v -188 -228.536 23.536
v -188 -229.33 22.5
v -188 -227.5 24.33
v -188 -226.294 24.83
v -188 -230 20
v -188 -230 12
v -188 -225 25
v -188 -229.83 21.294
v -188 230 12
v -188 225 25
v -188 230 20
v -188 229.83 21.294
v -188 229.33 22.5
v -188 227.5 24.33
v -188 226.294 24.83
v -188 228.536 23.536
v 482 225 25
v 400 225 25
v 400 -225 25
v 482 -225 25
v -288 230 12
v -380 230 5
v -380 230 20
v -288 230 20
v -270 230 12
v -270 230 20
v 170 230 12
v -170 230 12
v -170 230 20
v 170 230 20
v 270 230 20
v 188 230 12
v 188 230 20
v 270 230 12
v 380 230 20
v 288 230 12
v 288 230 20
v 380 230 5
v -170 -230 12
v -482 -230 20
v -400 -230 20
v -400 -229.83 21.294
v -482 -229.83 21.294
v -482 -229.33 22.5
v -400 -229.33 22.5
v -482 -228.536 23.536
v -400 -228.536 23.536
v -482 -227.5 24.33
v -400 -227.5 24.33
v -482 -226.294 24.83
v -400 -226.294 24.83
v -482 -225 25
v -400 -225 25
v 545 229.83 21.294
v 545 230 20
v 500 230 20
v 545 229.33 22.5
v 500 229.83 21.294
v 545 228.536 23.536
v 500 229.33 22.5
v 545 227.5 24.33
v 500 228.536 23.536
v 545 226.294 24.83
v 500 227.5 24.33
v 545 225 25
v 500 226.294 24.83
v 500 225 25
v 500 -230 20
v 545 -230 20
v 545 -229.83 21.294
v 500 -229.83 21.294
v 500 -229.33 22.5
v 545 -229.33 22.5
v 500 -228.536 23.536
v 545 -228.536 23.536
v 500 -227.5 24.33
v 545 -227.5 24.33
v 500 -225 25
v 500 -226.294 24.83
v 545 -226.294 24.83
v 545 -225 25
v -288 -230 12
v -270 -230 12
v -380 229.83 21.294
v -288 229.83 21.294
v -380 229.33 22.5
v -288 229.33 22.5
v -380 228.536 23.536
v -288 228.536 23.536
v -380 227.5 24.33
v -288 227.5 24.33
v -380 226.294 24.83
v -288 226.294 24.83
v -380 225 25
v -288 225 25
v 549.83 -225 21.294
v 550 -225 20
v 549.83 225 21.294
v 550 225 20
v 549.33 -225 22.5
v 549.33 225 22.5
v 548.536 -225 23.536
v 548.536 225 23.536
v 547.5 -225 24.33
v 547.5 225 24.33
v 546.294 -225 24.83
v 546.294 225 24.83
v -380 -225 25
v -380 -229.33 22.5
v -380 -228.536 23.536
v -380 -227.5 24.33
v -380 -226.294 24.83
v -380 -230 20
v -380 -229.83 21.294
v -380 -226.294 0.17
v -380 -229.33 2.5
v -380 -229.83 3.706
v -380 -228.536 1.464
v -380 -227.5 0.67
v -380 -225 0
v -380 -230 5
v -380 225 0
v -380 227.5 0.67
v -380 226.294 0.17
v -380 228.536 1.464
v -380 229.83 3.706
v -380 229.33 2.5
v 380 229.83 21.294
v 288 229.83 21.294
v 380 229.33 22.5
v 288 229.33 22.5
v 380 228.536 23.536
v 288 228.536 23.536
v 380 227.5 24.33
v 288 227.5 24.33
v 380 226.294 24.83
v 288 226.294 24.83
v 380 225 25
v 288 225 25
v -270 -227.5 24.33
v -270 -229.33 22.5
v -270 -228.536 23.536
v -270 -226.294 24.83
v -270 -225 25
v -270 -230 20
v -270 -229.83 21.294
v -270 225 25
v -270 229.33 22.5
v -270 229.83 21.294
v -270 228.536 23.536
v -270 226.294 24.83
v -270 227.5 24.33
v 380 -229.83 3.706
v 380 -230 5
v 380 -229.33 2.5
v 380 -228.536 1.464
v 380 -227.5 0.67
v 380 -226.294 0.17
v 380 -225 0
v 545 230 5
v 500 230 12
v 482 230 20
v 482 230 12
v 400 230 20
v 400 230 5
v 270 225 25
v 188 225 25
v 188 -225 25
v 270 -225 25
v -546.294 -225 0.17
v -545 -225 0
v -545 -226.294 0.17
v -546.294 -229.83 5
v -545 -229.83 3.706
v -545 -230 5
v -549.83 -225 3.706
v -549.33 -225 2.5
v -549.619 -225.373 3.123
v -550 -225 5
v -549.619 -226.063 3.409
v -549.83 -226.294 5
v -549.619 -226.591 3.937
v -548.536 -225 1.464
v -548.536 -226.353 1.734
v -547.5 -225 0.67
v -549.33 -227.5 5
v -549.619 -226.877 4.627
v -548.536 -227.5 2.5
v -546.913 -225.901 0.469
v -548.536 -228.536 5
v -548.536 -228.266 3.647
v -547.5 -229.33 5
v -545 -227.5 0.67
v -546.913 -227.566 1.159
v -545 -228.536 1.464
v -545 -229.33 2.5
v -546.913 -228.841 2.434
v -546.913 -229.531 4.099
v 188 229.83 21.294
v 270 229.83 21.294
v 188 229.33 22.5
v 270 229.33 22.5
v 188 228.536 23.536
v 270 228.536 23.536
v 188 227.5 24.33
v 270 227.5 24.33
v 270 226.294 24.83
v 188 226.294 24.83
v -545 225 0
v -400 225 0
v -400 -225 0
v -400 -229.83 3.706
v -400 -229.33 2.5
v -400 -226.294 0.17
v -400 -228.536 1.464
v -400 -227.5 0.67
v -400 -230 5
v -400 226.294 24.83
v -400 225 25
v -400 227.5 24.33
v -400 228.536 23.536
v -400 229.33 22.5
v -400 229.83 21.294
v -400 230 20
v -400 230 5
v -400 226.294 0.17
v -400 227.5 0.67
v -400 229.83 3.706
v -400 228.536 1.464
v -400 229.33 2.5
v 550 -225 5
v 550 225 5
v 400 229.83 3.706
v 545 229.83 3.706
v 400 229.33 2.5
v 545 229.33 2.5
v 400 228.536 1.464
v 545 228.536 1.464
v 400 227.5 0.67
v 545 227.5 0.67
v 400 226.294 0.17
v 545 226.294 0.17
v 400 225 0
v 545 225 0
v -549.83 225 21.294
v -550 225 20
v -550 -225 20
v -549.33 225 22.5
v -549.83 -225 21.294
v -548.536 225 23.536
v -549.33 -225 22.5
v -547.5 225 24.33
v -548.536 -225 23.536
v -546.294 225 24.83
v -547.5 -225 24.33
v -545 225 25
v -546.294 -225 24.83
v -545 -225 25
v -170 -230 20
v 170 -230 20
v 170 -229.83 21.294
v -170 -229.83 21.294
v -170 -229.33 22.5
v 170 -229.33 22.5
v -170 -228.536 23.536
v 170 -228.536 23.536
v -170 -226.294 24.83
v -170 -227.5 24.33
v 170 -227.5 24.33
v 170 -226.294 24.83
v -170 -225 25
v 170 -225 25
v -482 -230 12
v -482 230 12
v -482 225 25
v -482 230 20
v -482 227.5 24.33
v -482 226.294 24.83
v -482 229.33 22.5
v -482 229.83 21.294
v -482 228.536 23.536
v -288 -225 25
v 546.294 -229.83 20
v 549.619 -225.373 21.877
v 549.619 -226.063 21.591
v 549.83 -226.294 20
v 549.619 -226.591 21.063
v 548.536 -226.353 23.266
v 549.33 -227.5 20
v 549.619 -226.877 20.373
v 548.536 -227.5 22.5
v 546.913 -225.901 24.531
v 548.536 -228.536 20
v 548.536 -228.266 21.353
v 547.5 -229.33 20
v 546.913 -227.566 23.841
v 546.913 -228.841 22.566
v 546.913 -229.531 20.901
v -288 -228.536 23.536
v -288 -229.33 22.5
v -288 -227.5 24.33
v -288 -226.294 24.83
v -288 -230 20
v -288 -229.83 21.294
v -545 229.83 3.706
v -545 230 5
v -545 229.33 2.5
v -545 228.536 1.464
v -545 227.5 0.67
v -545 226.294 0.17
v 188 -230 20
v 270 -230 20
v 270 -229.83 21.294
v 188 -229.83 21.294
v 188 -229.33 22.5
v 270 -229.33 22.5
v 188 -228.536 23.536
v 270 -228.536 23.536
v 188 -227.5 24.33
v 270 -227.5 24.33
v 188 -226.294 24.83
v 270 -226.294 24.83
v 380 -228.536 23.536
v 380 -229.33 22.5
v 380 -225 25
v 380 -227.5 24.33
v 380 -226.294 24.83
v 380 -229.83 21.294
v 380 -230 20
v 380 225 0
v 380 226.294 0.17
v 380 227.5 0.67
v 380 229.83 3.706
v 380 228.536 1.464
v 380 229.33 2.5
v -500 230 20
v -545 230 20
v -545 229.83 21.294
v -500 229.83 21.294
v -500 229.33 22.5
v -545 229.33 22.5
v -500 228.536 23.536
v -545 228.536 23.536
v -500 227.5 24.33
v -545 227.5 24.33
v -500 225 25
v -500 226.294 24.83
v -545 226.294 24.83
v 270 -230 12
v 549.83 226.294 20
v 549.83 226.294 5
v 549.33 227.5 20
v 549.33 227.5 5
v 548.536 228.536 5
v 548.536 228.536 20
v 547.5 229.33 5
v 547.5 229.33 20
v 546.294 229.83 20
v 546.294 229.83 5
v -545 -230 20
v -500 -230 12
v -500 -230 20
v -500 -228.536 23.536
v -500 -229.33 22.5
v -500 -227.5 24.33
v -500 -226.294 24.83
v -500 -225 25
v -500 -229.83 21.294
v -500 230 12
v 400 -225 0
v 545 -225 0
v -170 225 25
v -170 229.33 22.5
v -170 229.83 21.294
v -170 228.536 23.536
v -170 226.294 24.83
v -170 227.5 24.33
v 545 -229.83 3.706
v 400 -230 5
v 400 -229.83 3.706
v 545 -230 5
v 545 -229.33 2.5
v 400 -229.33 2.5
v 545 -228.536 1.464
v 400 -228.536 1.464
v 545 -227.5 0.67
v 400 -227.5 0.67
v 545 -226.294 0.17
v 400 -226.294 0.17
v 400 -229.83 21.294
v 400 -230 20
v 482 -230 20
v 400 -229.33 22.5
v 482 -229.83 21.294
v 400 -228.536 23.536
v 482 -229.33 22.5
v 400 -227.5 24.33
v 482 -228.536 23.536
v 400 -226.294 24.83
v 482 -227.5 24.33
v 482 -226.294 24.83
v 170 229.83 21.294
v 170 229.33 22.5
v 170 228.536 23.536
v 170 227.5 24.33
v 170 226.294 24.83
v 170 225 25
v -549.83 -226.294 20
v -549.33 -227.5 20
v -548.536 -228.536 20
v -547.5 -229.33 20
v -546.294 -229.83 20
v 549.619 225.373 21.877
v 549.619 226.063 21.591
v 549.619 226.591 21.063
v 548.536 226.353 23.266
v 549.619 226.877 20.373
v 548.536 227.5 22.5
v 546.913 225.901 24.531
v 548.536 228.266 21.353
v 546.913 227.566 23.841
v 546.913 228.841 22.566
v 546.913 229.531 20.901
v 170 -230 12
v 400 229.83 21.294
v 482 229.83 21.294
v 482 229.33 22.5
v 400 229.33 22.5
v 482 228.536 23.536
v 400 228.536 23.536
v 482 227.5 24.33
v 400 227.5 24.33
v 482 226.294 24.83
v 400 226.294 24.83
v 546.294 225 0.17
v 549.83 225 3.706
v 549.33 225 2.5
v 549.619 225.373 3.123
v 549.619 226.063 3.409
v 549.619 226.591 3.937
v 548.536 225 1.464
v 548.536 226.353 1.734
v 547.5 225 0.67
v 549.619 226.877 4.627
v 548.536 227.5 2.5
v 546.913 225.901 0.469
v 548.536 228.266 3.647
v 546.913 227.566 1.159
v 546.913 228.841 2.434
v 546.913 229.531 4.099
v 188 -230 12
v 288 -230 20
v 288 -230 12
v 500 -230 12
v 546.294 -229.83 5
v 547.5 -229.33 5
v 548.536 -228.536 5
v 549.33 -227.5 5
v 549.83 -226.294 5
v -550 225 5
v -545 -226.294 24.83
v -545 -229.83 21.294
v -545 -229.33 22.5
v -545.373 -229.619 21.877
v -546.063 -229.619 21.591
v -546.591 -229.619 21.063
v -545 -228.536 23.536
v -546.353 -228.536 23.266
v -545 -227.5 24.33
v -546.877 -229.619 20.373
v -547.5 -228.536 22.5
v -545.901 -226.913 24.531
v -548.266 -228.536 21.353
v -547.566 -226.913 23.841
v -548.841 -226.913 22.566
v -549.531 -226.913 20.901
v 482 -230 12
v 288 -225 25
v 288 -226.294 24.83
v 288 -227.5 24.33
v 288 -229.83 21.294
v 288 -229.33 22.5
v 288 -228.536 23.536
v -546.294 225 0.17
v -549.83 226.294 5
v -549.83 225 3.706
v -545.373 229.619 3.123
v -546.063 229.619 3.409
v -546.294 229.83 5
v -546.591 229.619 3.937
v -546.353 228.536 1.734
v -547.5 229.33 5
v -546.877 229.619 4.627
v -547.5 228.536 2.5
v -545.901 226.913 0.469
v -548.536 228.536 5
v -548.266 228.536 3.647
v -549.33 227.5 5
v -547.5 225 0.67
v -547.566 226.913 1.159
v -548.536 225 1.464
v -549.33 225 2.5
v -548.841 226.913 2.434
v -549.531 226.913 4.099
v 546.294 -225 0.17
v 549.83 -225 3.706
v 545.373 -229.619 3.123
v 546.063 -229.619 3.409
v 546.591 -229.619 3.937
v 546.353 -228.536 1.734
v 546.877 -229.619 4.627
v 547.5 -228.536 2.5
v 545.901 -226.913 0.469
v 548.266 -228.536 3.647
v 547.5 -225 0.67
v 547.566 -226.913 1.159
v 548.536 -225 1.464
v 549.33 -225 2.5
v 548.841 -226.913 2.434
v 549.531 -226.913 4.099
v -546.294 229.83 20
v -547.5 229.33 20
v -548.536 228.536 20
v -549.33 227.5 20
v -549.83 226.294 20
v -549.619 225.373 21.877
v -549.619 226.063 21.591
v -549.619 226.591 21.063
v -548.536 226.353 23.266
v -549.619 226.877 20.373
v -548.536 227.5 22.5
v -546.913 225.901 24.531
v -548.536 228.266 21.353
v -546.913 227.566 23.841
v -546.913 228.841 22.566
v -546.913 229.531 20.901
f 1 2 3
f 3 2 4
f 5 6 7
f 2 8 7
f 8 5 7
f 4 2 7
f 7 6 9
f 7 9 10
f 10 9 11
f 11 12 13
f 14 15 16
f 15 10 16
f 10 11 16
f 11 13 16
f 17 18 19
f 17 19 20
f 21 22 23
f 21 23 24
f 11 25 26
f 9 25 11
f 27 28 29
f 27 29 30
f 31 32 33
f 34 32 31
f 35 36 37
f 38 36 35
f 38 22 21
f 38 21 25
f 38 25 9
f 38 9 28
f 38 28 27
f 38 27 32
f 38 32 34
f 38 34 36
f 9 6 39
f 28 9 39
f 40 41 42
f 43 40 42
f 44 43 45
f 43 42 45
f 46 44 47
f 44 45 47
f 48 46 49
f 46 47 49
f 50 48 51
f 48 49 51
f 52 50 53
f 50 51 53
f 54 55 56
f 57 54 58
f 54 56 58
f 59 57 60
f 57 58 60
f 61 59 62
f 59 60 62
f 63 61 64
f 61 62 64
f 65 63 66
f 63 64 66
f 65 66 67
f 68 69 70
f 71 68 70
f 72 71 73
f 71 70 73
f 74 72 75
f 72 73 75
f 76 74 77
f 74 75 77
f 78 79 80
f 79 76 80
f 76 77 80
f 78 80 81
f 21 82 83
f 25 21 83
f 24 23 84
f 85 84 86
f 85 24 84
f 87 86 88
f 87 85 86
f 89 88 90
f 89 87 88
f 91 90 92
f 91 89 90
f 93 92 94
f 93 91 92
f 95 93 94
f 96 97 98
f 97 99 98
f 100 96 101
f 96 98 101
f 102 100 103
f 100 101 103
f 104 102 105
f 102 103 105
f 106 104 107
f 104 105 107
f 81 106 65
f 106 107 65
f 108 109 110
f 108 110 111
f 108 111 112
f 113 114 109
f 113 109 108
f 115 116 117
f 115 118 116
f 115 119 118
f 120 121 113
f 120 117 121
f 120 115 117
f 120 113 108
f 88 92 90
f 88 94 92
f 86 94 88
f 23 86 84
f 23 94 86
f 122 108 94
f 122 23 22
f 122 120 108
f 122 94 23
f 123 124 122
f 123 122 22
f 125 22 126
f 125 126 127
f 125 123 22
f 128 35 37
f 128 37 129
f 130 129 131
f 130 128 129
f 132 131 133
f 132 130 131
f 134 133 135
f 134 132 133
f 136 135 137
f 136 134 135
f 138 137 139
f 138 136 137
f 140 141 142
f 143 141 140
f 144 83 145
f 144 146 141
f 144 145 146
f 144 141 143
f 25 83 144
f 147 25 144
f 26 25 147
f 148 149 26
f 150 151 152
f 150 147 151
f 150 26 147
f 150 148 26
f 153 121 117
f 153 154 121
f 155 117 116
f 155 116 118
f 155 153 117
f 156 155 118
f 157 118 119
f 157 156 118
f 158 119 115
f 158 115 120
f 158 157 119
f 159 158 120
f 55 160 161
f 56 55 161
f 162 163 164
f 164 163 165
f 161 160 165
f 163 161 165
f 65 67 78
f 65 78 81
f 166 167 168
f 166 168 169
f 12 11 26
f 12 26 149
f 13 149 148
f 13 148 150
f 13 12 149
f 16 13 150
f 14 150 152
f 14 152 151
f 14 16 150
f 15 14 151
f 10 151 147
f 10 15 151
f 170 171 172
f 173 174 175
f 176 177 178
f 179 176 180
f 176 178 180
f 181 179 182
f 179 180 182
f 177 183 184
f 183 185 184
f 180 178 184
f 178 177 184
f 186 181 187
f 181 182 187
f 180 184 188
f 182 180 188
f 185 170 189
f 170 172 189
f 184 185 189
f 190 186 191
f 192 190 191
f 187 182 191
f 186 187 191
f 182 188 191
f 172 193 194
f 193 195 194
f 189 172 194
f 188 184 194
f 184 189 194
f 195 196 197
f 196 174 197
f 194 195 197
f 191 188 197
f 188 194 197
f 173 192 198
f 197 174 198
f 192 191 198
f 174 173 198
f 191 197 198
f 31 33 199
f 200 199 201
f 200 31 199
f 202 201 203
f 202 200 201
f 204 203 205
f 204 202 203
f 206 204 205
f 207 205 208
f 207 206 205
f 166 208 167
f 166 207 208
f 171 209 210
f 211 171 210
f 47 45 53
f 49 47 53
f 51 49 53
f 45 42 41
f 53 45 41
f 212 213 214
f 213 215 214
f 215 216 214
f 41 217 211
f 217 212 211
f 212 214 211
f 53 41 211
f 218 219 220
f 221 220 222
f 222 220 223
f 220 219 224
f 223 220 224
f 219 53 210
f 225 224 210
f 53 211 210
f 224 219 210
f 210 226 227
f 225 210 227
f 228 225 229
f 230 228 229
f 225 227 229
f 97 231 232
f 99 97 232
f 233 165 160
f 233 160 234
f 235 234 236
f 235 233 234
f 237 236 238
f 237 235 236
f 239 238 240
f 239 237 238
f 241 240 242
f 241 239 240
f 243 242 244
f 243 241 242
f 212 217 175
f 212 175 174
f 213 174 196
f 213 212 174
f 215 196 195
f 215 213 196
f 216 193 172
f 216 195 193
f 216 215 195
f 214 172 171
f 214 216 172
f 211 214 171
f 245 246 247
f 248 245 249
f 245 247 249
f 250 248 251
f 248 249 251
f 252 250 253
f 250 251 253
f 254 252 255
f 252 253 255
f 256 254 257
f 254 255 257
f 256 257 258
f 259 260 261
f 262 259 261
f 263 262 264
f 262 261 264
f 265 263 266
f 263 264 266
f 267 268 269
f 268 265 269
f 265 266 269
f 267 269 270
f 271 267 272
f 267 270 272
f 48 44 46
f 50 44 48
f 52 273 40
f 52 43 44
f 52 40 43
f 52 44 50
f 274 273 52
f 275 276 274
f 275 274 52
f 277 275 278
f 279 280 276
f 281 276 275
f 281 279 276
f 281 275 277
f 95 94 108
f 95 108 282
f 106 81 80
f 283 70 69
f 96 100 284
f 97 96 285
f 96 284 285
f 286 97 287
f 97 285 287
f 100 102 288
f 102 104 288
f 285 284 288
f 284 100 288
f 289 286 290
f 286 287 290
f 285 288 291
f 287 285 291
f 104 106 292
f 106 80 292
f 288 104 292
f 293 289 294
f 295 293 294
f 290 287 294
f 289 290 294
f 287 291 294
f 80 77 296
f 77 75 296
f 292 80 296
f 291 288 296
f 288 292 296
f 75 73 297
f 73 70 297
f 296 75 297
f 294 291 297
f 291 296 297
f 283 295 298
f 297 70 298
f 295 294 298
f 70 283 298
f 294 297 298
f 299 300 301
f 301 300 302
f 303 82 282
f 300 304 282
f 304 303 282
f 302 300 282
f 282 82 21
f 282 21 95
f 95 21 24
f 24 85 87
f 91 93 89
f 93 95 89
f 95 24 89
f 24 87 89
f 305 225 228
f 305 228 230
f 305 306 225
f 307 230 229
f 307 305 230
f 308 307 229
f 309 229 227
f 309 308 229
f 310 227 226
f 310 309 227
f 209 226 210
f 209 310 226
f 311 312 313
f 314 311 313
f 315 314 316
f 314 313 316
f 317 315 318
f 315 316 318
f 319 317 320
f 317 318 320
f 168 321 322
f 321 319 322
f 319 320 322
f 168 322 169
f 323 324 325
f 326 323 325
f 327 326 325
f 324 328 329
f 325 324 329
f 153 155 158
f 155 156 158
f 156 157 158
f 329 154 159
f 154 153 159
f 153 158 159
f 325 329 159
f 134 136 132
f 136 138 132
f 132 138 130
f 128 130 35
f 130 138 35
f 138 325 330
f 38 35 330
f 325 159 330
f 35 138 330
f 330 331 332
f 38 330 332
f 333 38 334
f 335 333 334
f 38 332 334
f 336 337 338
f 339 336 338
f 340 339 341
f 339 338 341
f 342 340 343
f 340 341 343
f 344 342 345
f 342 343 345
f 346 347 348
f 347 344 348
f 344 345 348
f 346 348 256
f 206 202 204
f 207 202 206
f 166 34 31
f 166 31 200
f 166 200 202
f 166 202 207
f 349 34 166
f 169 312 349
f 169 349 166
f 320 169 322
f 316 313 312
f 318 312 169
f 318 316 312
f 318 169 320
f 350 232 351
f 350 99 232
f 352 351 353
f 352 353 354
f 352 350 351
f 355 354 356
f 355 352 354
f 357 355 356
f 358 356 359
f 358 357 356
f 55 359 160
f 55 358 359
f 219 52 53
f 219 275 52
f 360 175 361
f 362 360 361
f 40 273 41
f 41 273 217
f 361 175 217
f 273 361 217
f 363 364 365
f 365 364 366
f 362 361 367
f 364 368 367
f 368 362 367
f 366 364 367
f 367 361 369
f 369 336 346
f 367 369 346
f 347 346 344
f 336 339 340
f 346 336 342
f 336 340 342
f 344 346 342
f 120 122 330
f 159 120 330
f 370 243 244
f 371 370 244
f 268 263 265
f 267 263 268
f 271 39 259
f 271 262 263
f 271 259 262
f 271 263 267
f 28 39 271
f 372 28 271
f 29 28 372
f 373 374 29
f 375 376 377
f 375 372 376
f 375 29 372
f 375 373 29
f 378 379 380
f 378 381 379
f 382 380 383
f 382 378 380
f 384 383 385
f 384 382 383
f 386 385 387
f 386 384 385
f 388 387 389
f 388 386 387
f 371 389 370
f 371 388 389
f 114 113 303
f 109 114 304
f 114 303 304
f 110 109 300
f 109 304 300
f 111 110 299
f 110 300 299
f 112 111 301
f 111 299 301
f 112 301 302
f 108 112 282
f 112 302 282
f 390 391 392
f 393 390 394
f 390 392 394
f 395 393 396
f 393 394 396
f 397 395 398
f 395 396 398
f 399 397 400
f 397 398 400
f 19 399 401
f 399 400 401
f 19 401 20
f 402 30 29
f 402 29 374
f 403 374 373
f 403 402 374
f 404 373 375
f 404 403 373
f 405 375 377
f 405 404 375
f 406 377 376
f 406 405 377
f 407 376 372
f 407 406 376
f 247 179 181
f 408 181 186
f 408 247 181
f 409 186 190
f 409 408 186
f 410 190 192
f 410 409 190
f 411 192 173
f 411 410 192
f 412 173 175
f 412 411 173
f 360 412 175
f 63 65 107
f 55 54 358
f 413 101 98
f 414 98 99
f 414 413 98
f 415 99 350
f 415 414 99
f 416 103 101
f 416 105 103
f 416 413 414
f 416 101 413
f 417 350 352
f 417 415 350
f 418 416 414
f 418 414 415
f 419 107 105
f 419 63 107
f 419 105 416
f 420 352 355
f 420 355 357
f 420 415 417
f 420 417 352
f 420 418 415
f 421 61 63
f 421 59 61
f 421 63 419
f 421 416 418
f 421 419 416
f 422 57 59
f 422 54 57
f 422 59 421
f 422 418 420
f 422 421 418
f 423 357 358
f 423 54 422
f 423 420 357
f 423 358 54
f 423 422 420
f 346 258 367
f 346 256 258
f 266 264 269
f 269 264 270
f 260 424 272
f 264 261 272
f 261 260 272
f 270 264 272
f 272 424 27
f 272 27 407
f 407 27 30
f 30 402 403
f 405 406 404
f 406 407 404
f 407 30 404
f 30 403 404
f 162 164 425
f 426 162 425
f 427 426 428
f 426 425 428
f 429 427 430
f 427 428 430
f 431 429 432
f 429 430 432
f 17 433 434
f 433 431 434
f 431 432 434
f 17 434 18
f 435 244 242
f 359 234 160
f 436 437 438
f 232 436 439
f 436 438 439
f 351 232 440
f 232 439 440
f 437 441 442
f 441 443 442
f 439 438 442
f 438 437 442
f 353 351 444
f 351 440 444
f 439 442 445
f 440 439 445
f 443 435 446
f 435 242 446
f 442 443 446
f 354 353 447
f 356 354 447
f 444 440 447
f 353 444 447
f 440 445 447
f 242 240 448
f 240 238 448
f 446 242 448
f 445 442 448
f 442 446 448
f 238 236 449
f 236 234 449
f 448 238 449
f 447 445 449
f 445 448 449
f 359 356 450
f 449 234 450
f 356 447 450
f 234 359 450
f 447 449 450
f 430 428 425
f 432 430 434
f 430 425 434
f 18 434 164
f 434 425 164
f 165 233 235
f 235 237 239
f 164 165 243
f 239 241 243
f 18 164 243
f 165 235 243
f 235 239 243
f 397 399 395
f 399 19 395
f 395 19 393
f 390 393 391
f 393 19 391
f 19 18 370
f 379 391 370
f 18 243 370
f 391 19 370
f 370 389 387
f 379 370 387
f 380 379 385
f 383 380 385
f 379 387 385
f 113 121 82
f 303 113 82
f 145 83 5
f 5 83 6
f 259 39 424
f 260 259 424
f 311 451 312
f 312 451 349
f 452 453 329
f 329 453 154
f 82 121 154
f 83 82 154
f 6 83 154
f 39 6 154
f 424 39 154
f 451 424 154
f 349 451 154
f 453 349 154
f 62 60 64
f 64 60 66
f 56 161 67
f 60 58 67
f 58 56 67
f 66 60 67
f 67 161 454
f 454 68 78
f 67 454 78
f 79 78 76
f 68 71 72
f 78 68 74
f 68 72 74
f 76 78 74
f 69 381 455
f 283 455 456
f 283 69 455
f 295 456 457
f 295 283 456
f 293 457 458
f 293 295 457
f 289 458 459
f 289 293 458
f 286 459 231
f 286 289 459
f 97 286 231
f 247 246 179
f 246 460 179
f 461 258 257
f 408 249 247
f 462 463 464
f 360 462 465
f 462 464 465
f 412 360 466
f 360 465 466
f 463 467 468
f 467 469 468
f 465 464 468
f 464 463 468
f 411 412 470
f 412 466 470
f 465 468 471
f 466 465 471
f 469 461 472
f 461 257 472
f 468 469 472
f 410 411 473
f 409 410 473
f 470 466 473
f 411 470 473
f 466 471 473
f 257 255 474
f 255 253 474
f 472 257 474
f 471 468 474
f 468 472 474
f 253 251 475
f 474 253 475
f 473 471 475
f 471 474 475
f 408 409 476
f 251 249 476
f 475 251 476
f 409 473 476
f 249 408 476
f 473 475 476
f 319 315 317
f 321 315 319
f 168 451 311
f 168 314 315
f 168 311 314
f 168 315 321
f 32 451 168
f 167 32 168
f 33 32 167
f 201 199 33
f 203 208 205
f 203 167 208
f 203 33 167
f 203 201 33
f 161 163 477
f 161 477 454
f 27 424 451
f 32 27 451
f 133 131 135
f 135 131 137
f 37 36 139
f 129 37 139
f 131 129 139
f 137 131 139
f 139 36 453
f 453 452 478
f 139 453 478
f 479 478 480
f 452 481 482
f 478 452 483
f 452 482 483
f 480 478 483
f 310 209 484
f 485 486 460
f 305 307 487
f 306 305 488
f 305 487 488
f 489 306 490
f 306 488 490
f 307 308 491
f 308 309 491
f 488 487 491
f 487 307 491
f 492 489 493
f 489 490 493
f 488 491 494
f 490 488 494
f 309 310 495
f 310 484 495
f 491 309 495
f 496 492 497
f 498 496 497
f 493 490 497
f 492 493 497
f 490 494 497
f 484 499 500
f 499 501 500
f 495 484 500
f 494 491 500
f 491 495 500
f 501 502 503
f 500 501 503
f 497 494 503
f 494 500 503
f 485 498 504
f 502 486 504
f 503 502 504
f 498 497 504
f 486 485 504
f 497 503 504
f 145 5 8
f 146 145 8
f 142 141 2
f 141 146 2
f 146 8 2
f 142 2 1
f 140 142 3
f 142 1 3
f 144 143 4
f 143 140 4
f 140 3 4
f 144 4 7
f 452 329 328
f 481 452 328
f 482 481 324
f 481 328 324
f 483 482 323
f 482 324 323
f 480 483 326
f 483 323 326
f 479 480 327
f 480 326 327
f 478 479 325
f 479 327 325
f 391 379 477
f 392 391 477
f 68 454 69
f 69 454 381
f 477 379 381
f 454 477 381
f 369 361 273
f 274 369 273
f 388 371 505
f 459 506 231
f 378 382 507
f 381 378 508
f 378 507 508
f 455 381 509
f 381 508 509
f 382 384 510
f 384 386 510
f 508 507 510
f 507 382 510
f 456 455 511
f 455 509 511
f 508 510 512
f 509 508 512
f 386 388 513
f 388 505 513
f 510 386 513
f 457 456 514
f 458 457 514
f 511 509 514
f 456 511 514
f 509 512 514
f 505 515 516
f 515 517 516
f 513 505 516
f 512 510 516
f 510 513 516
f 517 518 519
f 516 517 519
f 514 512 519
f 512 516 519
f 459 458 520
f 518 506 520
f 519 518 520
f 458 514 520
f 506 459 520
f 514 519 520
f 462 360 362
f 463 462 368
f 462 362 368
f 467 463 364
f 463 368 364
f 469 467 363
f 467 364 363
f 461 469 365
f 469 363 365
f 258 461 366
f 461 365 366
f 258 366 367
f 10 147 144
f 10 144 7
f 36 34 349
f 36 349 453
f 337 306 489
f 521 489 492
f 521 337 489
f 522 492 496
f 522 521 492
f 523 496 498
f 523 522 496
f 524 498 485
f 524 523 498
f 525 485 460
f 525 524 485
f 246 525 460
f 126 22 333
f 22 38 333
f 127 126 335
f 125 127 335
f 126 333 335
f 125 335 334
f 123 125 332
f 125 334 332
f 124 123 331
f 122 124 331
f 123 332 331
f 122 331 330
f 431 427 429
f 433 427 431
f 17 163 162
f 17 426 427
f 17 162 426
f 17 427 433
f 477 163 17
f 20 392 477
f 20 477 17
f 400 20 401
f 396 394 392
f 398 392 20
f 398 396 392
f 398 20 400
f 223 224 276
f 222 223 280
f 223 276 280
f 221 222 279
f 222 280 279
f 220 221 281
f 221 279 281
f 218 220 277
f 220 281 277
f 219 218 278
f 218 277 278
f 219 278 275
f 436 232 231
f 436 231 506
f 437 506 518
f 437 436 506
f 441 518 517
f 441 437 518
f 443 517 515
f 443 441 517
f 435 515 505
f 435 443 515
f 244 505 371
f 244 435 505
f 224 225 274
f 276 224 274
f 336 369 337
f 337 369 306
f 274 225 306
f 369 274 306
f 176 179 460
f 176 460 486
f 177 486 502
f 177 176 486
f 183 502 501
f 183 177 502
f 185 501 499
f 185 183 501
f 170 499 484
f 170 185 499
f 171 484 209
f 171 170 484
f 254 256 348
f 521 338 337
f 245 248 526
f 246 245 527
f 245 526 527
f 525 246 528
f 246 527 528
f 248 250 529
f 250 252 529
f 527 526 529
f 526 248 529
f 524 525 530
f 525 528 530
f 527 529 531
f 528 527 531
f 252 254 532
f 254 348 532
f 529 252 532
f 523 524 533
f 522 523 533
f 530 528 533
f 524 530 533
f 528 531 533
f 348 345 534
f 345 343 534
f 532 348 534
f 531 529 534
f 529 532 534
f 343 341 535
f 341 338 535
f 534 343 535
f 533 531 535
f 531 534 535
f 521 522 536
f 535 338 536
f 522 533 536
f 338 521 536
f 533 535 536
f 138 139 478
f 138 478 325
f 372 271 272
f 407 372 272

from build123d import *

# Parameters (mm, degrees)
F0_W     = 760
F0_H     = 460
F1_DEPTH = 25
F2_R     = 5
F3_W     = 18
F3_H     = 13
F4_DEPTH = 250
F6_DEPTH = 25
F7_R     = 5
F8_W     = 18
F8_H     = 13
F9_DEPTH = 250


with BuildPart() as f1:
    # F0 (on Top) → F1 (new body)
    with BuildSketch(Plane.XY):
        Rectangle(F0_W, F0_H)
    extrude(amount=F1_DEPTH)

    # F2
    f2_edges = [f1.edges().sort_by_distance(p)[0] for p in [
        (0, -230, 25),
        (0, 230, 25),
        (0, 230, 0),
        (0, -230, 0),
    ]]
    fillet(f2_edges, radius=F2_R)

    # F3 (on Front) → F4 (cut, symmetric)
    with BuildSketch(Plane.XZ):
        with Locations((-179, 18.5)):
            Rectangle(F3_W, F3_H)
        with Locations((-279, 18.5)):
            Rectangle(F3_W, F3_H)
        with Locations((179, 18.5)):
            Rectangle(F3_W, F3_H)
        with Locations((279, 18.5)):
            Rectangle(F3_W, F3_H)
    extrude(amount=F4_DEPTH, both=True, mode=Mode.SUBTRACT)


with BuildPart() as f6:
    # F5 (on Top) → F6 (new body)
    with BuildSketch(Plane.XY):
        Polygon((-400, -230), (-400, 0), (-400, 230), (-550, 230), (-550, -230), align=None)
        Polygon((400, 0), (400, -230), (550, -230), (550, 230), (400, 230), align=None)
    extrude(amount=F6_DEPTH)

    # F7
    f7_edges = [f6.edges().sort_by_distance(p)[0] for p in [
        (-475, 230, 25),
        (-550, 0, 25),
        (-475, -230, 25),
        (-475, -230, 0),
        (-550, 0, 0),
        (-475, 230, 0),
        (475, 230, 0),
        (550, 0, 0),
        (475, -230, 0),
        (475, 230, 25),
        (475, -230, 25),
        (550, 0, 25),
        (550, -230, 12.5),
        (550, 230, 12.5),
        (-550, -230, 12.5),
        (-550, 230, 12.5),
    ]]
    fillet(f7_edges, radius=F7_R)

    # F8 (on Front) → F9 (cut, symmetric)
    with BuildSketch(Plane.XZ):
        with Locations((-491, 18.5)):
            Rectangle(F8_W, F8_H)
        with Locations((491, 18.5)):
            Rectangle(F8_W, F8_H)
    extrude(amount=F9_DEPTH, both=True, mode=Mode.SUBTRACT)


solid = Compound([f1.part, f6.part])
